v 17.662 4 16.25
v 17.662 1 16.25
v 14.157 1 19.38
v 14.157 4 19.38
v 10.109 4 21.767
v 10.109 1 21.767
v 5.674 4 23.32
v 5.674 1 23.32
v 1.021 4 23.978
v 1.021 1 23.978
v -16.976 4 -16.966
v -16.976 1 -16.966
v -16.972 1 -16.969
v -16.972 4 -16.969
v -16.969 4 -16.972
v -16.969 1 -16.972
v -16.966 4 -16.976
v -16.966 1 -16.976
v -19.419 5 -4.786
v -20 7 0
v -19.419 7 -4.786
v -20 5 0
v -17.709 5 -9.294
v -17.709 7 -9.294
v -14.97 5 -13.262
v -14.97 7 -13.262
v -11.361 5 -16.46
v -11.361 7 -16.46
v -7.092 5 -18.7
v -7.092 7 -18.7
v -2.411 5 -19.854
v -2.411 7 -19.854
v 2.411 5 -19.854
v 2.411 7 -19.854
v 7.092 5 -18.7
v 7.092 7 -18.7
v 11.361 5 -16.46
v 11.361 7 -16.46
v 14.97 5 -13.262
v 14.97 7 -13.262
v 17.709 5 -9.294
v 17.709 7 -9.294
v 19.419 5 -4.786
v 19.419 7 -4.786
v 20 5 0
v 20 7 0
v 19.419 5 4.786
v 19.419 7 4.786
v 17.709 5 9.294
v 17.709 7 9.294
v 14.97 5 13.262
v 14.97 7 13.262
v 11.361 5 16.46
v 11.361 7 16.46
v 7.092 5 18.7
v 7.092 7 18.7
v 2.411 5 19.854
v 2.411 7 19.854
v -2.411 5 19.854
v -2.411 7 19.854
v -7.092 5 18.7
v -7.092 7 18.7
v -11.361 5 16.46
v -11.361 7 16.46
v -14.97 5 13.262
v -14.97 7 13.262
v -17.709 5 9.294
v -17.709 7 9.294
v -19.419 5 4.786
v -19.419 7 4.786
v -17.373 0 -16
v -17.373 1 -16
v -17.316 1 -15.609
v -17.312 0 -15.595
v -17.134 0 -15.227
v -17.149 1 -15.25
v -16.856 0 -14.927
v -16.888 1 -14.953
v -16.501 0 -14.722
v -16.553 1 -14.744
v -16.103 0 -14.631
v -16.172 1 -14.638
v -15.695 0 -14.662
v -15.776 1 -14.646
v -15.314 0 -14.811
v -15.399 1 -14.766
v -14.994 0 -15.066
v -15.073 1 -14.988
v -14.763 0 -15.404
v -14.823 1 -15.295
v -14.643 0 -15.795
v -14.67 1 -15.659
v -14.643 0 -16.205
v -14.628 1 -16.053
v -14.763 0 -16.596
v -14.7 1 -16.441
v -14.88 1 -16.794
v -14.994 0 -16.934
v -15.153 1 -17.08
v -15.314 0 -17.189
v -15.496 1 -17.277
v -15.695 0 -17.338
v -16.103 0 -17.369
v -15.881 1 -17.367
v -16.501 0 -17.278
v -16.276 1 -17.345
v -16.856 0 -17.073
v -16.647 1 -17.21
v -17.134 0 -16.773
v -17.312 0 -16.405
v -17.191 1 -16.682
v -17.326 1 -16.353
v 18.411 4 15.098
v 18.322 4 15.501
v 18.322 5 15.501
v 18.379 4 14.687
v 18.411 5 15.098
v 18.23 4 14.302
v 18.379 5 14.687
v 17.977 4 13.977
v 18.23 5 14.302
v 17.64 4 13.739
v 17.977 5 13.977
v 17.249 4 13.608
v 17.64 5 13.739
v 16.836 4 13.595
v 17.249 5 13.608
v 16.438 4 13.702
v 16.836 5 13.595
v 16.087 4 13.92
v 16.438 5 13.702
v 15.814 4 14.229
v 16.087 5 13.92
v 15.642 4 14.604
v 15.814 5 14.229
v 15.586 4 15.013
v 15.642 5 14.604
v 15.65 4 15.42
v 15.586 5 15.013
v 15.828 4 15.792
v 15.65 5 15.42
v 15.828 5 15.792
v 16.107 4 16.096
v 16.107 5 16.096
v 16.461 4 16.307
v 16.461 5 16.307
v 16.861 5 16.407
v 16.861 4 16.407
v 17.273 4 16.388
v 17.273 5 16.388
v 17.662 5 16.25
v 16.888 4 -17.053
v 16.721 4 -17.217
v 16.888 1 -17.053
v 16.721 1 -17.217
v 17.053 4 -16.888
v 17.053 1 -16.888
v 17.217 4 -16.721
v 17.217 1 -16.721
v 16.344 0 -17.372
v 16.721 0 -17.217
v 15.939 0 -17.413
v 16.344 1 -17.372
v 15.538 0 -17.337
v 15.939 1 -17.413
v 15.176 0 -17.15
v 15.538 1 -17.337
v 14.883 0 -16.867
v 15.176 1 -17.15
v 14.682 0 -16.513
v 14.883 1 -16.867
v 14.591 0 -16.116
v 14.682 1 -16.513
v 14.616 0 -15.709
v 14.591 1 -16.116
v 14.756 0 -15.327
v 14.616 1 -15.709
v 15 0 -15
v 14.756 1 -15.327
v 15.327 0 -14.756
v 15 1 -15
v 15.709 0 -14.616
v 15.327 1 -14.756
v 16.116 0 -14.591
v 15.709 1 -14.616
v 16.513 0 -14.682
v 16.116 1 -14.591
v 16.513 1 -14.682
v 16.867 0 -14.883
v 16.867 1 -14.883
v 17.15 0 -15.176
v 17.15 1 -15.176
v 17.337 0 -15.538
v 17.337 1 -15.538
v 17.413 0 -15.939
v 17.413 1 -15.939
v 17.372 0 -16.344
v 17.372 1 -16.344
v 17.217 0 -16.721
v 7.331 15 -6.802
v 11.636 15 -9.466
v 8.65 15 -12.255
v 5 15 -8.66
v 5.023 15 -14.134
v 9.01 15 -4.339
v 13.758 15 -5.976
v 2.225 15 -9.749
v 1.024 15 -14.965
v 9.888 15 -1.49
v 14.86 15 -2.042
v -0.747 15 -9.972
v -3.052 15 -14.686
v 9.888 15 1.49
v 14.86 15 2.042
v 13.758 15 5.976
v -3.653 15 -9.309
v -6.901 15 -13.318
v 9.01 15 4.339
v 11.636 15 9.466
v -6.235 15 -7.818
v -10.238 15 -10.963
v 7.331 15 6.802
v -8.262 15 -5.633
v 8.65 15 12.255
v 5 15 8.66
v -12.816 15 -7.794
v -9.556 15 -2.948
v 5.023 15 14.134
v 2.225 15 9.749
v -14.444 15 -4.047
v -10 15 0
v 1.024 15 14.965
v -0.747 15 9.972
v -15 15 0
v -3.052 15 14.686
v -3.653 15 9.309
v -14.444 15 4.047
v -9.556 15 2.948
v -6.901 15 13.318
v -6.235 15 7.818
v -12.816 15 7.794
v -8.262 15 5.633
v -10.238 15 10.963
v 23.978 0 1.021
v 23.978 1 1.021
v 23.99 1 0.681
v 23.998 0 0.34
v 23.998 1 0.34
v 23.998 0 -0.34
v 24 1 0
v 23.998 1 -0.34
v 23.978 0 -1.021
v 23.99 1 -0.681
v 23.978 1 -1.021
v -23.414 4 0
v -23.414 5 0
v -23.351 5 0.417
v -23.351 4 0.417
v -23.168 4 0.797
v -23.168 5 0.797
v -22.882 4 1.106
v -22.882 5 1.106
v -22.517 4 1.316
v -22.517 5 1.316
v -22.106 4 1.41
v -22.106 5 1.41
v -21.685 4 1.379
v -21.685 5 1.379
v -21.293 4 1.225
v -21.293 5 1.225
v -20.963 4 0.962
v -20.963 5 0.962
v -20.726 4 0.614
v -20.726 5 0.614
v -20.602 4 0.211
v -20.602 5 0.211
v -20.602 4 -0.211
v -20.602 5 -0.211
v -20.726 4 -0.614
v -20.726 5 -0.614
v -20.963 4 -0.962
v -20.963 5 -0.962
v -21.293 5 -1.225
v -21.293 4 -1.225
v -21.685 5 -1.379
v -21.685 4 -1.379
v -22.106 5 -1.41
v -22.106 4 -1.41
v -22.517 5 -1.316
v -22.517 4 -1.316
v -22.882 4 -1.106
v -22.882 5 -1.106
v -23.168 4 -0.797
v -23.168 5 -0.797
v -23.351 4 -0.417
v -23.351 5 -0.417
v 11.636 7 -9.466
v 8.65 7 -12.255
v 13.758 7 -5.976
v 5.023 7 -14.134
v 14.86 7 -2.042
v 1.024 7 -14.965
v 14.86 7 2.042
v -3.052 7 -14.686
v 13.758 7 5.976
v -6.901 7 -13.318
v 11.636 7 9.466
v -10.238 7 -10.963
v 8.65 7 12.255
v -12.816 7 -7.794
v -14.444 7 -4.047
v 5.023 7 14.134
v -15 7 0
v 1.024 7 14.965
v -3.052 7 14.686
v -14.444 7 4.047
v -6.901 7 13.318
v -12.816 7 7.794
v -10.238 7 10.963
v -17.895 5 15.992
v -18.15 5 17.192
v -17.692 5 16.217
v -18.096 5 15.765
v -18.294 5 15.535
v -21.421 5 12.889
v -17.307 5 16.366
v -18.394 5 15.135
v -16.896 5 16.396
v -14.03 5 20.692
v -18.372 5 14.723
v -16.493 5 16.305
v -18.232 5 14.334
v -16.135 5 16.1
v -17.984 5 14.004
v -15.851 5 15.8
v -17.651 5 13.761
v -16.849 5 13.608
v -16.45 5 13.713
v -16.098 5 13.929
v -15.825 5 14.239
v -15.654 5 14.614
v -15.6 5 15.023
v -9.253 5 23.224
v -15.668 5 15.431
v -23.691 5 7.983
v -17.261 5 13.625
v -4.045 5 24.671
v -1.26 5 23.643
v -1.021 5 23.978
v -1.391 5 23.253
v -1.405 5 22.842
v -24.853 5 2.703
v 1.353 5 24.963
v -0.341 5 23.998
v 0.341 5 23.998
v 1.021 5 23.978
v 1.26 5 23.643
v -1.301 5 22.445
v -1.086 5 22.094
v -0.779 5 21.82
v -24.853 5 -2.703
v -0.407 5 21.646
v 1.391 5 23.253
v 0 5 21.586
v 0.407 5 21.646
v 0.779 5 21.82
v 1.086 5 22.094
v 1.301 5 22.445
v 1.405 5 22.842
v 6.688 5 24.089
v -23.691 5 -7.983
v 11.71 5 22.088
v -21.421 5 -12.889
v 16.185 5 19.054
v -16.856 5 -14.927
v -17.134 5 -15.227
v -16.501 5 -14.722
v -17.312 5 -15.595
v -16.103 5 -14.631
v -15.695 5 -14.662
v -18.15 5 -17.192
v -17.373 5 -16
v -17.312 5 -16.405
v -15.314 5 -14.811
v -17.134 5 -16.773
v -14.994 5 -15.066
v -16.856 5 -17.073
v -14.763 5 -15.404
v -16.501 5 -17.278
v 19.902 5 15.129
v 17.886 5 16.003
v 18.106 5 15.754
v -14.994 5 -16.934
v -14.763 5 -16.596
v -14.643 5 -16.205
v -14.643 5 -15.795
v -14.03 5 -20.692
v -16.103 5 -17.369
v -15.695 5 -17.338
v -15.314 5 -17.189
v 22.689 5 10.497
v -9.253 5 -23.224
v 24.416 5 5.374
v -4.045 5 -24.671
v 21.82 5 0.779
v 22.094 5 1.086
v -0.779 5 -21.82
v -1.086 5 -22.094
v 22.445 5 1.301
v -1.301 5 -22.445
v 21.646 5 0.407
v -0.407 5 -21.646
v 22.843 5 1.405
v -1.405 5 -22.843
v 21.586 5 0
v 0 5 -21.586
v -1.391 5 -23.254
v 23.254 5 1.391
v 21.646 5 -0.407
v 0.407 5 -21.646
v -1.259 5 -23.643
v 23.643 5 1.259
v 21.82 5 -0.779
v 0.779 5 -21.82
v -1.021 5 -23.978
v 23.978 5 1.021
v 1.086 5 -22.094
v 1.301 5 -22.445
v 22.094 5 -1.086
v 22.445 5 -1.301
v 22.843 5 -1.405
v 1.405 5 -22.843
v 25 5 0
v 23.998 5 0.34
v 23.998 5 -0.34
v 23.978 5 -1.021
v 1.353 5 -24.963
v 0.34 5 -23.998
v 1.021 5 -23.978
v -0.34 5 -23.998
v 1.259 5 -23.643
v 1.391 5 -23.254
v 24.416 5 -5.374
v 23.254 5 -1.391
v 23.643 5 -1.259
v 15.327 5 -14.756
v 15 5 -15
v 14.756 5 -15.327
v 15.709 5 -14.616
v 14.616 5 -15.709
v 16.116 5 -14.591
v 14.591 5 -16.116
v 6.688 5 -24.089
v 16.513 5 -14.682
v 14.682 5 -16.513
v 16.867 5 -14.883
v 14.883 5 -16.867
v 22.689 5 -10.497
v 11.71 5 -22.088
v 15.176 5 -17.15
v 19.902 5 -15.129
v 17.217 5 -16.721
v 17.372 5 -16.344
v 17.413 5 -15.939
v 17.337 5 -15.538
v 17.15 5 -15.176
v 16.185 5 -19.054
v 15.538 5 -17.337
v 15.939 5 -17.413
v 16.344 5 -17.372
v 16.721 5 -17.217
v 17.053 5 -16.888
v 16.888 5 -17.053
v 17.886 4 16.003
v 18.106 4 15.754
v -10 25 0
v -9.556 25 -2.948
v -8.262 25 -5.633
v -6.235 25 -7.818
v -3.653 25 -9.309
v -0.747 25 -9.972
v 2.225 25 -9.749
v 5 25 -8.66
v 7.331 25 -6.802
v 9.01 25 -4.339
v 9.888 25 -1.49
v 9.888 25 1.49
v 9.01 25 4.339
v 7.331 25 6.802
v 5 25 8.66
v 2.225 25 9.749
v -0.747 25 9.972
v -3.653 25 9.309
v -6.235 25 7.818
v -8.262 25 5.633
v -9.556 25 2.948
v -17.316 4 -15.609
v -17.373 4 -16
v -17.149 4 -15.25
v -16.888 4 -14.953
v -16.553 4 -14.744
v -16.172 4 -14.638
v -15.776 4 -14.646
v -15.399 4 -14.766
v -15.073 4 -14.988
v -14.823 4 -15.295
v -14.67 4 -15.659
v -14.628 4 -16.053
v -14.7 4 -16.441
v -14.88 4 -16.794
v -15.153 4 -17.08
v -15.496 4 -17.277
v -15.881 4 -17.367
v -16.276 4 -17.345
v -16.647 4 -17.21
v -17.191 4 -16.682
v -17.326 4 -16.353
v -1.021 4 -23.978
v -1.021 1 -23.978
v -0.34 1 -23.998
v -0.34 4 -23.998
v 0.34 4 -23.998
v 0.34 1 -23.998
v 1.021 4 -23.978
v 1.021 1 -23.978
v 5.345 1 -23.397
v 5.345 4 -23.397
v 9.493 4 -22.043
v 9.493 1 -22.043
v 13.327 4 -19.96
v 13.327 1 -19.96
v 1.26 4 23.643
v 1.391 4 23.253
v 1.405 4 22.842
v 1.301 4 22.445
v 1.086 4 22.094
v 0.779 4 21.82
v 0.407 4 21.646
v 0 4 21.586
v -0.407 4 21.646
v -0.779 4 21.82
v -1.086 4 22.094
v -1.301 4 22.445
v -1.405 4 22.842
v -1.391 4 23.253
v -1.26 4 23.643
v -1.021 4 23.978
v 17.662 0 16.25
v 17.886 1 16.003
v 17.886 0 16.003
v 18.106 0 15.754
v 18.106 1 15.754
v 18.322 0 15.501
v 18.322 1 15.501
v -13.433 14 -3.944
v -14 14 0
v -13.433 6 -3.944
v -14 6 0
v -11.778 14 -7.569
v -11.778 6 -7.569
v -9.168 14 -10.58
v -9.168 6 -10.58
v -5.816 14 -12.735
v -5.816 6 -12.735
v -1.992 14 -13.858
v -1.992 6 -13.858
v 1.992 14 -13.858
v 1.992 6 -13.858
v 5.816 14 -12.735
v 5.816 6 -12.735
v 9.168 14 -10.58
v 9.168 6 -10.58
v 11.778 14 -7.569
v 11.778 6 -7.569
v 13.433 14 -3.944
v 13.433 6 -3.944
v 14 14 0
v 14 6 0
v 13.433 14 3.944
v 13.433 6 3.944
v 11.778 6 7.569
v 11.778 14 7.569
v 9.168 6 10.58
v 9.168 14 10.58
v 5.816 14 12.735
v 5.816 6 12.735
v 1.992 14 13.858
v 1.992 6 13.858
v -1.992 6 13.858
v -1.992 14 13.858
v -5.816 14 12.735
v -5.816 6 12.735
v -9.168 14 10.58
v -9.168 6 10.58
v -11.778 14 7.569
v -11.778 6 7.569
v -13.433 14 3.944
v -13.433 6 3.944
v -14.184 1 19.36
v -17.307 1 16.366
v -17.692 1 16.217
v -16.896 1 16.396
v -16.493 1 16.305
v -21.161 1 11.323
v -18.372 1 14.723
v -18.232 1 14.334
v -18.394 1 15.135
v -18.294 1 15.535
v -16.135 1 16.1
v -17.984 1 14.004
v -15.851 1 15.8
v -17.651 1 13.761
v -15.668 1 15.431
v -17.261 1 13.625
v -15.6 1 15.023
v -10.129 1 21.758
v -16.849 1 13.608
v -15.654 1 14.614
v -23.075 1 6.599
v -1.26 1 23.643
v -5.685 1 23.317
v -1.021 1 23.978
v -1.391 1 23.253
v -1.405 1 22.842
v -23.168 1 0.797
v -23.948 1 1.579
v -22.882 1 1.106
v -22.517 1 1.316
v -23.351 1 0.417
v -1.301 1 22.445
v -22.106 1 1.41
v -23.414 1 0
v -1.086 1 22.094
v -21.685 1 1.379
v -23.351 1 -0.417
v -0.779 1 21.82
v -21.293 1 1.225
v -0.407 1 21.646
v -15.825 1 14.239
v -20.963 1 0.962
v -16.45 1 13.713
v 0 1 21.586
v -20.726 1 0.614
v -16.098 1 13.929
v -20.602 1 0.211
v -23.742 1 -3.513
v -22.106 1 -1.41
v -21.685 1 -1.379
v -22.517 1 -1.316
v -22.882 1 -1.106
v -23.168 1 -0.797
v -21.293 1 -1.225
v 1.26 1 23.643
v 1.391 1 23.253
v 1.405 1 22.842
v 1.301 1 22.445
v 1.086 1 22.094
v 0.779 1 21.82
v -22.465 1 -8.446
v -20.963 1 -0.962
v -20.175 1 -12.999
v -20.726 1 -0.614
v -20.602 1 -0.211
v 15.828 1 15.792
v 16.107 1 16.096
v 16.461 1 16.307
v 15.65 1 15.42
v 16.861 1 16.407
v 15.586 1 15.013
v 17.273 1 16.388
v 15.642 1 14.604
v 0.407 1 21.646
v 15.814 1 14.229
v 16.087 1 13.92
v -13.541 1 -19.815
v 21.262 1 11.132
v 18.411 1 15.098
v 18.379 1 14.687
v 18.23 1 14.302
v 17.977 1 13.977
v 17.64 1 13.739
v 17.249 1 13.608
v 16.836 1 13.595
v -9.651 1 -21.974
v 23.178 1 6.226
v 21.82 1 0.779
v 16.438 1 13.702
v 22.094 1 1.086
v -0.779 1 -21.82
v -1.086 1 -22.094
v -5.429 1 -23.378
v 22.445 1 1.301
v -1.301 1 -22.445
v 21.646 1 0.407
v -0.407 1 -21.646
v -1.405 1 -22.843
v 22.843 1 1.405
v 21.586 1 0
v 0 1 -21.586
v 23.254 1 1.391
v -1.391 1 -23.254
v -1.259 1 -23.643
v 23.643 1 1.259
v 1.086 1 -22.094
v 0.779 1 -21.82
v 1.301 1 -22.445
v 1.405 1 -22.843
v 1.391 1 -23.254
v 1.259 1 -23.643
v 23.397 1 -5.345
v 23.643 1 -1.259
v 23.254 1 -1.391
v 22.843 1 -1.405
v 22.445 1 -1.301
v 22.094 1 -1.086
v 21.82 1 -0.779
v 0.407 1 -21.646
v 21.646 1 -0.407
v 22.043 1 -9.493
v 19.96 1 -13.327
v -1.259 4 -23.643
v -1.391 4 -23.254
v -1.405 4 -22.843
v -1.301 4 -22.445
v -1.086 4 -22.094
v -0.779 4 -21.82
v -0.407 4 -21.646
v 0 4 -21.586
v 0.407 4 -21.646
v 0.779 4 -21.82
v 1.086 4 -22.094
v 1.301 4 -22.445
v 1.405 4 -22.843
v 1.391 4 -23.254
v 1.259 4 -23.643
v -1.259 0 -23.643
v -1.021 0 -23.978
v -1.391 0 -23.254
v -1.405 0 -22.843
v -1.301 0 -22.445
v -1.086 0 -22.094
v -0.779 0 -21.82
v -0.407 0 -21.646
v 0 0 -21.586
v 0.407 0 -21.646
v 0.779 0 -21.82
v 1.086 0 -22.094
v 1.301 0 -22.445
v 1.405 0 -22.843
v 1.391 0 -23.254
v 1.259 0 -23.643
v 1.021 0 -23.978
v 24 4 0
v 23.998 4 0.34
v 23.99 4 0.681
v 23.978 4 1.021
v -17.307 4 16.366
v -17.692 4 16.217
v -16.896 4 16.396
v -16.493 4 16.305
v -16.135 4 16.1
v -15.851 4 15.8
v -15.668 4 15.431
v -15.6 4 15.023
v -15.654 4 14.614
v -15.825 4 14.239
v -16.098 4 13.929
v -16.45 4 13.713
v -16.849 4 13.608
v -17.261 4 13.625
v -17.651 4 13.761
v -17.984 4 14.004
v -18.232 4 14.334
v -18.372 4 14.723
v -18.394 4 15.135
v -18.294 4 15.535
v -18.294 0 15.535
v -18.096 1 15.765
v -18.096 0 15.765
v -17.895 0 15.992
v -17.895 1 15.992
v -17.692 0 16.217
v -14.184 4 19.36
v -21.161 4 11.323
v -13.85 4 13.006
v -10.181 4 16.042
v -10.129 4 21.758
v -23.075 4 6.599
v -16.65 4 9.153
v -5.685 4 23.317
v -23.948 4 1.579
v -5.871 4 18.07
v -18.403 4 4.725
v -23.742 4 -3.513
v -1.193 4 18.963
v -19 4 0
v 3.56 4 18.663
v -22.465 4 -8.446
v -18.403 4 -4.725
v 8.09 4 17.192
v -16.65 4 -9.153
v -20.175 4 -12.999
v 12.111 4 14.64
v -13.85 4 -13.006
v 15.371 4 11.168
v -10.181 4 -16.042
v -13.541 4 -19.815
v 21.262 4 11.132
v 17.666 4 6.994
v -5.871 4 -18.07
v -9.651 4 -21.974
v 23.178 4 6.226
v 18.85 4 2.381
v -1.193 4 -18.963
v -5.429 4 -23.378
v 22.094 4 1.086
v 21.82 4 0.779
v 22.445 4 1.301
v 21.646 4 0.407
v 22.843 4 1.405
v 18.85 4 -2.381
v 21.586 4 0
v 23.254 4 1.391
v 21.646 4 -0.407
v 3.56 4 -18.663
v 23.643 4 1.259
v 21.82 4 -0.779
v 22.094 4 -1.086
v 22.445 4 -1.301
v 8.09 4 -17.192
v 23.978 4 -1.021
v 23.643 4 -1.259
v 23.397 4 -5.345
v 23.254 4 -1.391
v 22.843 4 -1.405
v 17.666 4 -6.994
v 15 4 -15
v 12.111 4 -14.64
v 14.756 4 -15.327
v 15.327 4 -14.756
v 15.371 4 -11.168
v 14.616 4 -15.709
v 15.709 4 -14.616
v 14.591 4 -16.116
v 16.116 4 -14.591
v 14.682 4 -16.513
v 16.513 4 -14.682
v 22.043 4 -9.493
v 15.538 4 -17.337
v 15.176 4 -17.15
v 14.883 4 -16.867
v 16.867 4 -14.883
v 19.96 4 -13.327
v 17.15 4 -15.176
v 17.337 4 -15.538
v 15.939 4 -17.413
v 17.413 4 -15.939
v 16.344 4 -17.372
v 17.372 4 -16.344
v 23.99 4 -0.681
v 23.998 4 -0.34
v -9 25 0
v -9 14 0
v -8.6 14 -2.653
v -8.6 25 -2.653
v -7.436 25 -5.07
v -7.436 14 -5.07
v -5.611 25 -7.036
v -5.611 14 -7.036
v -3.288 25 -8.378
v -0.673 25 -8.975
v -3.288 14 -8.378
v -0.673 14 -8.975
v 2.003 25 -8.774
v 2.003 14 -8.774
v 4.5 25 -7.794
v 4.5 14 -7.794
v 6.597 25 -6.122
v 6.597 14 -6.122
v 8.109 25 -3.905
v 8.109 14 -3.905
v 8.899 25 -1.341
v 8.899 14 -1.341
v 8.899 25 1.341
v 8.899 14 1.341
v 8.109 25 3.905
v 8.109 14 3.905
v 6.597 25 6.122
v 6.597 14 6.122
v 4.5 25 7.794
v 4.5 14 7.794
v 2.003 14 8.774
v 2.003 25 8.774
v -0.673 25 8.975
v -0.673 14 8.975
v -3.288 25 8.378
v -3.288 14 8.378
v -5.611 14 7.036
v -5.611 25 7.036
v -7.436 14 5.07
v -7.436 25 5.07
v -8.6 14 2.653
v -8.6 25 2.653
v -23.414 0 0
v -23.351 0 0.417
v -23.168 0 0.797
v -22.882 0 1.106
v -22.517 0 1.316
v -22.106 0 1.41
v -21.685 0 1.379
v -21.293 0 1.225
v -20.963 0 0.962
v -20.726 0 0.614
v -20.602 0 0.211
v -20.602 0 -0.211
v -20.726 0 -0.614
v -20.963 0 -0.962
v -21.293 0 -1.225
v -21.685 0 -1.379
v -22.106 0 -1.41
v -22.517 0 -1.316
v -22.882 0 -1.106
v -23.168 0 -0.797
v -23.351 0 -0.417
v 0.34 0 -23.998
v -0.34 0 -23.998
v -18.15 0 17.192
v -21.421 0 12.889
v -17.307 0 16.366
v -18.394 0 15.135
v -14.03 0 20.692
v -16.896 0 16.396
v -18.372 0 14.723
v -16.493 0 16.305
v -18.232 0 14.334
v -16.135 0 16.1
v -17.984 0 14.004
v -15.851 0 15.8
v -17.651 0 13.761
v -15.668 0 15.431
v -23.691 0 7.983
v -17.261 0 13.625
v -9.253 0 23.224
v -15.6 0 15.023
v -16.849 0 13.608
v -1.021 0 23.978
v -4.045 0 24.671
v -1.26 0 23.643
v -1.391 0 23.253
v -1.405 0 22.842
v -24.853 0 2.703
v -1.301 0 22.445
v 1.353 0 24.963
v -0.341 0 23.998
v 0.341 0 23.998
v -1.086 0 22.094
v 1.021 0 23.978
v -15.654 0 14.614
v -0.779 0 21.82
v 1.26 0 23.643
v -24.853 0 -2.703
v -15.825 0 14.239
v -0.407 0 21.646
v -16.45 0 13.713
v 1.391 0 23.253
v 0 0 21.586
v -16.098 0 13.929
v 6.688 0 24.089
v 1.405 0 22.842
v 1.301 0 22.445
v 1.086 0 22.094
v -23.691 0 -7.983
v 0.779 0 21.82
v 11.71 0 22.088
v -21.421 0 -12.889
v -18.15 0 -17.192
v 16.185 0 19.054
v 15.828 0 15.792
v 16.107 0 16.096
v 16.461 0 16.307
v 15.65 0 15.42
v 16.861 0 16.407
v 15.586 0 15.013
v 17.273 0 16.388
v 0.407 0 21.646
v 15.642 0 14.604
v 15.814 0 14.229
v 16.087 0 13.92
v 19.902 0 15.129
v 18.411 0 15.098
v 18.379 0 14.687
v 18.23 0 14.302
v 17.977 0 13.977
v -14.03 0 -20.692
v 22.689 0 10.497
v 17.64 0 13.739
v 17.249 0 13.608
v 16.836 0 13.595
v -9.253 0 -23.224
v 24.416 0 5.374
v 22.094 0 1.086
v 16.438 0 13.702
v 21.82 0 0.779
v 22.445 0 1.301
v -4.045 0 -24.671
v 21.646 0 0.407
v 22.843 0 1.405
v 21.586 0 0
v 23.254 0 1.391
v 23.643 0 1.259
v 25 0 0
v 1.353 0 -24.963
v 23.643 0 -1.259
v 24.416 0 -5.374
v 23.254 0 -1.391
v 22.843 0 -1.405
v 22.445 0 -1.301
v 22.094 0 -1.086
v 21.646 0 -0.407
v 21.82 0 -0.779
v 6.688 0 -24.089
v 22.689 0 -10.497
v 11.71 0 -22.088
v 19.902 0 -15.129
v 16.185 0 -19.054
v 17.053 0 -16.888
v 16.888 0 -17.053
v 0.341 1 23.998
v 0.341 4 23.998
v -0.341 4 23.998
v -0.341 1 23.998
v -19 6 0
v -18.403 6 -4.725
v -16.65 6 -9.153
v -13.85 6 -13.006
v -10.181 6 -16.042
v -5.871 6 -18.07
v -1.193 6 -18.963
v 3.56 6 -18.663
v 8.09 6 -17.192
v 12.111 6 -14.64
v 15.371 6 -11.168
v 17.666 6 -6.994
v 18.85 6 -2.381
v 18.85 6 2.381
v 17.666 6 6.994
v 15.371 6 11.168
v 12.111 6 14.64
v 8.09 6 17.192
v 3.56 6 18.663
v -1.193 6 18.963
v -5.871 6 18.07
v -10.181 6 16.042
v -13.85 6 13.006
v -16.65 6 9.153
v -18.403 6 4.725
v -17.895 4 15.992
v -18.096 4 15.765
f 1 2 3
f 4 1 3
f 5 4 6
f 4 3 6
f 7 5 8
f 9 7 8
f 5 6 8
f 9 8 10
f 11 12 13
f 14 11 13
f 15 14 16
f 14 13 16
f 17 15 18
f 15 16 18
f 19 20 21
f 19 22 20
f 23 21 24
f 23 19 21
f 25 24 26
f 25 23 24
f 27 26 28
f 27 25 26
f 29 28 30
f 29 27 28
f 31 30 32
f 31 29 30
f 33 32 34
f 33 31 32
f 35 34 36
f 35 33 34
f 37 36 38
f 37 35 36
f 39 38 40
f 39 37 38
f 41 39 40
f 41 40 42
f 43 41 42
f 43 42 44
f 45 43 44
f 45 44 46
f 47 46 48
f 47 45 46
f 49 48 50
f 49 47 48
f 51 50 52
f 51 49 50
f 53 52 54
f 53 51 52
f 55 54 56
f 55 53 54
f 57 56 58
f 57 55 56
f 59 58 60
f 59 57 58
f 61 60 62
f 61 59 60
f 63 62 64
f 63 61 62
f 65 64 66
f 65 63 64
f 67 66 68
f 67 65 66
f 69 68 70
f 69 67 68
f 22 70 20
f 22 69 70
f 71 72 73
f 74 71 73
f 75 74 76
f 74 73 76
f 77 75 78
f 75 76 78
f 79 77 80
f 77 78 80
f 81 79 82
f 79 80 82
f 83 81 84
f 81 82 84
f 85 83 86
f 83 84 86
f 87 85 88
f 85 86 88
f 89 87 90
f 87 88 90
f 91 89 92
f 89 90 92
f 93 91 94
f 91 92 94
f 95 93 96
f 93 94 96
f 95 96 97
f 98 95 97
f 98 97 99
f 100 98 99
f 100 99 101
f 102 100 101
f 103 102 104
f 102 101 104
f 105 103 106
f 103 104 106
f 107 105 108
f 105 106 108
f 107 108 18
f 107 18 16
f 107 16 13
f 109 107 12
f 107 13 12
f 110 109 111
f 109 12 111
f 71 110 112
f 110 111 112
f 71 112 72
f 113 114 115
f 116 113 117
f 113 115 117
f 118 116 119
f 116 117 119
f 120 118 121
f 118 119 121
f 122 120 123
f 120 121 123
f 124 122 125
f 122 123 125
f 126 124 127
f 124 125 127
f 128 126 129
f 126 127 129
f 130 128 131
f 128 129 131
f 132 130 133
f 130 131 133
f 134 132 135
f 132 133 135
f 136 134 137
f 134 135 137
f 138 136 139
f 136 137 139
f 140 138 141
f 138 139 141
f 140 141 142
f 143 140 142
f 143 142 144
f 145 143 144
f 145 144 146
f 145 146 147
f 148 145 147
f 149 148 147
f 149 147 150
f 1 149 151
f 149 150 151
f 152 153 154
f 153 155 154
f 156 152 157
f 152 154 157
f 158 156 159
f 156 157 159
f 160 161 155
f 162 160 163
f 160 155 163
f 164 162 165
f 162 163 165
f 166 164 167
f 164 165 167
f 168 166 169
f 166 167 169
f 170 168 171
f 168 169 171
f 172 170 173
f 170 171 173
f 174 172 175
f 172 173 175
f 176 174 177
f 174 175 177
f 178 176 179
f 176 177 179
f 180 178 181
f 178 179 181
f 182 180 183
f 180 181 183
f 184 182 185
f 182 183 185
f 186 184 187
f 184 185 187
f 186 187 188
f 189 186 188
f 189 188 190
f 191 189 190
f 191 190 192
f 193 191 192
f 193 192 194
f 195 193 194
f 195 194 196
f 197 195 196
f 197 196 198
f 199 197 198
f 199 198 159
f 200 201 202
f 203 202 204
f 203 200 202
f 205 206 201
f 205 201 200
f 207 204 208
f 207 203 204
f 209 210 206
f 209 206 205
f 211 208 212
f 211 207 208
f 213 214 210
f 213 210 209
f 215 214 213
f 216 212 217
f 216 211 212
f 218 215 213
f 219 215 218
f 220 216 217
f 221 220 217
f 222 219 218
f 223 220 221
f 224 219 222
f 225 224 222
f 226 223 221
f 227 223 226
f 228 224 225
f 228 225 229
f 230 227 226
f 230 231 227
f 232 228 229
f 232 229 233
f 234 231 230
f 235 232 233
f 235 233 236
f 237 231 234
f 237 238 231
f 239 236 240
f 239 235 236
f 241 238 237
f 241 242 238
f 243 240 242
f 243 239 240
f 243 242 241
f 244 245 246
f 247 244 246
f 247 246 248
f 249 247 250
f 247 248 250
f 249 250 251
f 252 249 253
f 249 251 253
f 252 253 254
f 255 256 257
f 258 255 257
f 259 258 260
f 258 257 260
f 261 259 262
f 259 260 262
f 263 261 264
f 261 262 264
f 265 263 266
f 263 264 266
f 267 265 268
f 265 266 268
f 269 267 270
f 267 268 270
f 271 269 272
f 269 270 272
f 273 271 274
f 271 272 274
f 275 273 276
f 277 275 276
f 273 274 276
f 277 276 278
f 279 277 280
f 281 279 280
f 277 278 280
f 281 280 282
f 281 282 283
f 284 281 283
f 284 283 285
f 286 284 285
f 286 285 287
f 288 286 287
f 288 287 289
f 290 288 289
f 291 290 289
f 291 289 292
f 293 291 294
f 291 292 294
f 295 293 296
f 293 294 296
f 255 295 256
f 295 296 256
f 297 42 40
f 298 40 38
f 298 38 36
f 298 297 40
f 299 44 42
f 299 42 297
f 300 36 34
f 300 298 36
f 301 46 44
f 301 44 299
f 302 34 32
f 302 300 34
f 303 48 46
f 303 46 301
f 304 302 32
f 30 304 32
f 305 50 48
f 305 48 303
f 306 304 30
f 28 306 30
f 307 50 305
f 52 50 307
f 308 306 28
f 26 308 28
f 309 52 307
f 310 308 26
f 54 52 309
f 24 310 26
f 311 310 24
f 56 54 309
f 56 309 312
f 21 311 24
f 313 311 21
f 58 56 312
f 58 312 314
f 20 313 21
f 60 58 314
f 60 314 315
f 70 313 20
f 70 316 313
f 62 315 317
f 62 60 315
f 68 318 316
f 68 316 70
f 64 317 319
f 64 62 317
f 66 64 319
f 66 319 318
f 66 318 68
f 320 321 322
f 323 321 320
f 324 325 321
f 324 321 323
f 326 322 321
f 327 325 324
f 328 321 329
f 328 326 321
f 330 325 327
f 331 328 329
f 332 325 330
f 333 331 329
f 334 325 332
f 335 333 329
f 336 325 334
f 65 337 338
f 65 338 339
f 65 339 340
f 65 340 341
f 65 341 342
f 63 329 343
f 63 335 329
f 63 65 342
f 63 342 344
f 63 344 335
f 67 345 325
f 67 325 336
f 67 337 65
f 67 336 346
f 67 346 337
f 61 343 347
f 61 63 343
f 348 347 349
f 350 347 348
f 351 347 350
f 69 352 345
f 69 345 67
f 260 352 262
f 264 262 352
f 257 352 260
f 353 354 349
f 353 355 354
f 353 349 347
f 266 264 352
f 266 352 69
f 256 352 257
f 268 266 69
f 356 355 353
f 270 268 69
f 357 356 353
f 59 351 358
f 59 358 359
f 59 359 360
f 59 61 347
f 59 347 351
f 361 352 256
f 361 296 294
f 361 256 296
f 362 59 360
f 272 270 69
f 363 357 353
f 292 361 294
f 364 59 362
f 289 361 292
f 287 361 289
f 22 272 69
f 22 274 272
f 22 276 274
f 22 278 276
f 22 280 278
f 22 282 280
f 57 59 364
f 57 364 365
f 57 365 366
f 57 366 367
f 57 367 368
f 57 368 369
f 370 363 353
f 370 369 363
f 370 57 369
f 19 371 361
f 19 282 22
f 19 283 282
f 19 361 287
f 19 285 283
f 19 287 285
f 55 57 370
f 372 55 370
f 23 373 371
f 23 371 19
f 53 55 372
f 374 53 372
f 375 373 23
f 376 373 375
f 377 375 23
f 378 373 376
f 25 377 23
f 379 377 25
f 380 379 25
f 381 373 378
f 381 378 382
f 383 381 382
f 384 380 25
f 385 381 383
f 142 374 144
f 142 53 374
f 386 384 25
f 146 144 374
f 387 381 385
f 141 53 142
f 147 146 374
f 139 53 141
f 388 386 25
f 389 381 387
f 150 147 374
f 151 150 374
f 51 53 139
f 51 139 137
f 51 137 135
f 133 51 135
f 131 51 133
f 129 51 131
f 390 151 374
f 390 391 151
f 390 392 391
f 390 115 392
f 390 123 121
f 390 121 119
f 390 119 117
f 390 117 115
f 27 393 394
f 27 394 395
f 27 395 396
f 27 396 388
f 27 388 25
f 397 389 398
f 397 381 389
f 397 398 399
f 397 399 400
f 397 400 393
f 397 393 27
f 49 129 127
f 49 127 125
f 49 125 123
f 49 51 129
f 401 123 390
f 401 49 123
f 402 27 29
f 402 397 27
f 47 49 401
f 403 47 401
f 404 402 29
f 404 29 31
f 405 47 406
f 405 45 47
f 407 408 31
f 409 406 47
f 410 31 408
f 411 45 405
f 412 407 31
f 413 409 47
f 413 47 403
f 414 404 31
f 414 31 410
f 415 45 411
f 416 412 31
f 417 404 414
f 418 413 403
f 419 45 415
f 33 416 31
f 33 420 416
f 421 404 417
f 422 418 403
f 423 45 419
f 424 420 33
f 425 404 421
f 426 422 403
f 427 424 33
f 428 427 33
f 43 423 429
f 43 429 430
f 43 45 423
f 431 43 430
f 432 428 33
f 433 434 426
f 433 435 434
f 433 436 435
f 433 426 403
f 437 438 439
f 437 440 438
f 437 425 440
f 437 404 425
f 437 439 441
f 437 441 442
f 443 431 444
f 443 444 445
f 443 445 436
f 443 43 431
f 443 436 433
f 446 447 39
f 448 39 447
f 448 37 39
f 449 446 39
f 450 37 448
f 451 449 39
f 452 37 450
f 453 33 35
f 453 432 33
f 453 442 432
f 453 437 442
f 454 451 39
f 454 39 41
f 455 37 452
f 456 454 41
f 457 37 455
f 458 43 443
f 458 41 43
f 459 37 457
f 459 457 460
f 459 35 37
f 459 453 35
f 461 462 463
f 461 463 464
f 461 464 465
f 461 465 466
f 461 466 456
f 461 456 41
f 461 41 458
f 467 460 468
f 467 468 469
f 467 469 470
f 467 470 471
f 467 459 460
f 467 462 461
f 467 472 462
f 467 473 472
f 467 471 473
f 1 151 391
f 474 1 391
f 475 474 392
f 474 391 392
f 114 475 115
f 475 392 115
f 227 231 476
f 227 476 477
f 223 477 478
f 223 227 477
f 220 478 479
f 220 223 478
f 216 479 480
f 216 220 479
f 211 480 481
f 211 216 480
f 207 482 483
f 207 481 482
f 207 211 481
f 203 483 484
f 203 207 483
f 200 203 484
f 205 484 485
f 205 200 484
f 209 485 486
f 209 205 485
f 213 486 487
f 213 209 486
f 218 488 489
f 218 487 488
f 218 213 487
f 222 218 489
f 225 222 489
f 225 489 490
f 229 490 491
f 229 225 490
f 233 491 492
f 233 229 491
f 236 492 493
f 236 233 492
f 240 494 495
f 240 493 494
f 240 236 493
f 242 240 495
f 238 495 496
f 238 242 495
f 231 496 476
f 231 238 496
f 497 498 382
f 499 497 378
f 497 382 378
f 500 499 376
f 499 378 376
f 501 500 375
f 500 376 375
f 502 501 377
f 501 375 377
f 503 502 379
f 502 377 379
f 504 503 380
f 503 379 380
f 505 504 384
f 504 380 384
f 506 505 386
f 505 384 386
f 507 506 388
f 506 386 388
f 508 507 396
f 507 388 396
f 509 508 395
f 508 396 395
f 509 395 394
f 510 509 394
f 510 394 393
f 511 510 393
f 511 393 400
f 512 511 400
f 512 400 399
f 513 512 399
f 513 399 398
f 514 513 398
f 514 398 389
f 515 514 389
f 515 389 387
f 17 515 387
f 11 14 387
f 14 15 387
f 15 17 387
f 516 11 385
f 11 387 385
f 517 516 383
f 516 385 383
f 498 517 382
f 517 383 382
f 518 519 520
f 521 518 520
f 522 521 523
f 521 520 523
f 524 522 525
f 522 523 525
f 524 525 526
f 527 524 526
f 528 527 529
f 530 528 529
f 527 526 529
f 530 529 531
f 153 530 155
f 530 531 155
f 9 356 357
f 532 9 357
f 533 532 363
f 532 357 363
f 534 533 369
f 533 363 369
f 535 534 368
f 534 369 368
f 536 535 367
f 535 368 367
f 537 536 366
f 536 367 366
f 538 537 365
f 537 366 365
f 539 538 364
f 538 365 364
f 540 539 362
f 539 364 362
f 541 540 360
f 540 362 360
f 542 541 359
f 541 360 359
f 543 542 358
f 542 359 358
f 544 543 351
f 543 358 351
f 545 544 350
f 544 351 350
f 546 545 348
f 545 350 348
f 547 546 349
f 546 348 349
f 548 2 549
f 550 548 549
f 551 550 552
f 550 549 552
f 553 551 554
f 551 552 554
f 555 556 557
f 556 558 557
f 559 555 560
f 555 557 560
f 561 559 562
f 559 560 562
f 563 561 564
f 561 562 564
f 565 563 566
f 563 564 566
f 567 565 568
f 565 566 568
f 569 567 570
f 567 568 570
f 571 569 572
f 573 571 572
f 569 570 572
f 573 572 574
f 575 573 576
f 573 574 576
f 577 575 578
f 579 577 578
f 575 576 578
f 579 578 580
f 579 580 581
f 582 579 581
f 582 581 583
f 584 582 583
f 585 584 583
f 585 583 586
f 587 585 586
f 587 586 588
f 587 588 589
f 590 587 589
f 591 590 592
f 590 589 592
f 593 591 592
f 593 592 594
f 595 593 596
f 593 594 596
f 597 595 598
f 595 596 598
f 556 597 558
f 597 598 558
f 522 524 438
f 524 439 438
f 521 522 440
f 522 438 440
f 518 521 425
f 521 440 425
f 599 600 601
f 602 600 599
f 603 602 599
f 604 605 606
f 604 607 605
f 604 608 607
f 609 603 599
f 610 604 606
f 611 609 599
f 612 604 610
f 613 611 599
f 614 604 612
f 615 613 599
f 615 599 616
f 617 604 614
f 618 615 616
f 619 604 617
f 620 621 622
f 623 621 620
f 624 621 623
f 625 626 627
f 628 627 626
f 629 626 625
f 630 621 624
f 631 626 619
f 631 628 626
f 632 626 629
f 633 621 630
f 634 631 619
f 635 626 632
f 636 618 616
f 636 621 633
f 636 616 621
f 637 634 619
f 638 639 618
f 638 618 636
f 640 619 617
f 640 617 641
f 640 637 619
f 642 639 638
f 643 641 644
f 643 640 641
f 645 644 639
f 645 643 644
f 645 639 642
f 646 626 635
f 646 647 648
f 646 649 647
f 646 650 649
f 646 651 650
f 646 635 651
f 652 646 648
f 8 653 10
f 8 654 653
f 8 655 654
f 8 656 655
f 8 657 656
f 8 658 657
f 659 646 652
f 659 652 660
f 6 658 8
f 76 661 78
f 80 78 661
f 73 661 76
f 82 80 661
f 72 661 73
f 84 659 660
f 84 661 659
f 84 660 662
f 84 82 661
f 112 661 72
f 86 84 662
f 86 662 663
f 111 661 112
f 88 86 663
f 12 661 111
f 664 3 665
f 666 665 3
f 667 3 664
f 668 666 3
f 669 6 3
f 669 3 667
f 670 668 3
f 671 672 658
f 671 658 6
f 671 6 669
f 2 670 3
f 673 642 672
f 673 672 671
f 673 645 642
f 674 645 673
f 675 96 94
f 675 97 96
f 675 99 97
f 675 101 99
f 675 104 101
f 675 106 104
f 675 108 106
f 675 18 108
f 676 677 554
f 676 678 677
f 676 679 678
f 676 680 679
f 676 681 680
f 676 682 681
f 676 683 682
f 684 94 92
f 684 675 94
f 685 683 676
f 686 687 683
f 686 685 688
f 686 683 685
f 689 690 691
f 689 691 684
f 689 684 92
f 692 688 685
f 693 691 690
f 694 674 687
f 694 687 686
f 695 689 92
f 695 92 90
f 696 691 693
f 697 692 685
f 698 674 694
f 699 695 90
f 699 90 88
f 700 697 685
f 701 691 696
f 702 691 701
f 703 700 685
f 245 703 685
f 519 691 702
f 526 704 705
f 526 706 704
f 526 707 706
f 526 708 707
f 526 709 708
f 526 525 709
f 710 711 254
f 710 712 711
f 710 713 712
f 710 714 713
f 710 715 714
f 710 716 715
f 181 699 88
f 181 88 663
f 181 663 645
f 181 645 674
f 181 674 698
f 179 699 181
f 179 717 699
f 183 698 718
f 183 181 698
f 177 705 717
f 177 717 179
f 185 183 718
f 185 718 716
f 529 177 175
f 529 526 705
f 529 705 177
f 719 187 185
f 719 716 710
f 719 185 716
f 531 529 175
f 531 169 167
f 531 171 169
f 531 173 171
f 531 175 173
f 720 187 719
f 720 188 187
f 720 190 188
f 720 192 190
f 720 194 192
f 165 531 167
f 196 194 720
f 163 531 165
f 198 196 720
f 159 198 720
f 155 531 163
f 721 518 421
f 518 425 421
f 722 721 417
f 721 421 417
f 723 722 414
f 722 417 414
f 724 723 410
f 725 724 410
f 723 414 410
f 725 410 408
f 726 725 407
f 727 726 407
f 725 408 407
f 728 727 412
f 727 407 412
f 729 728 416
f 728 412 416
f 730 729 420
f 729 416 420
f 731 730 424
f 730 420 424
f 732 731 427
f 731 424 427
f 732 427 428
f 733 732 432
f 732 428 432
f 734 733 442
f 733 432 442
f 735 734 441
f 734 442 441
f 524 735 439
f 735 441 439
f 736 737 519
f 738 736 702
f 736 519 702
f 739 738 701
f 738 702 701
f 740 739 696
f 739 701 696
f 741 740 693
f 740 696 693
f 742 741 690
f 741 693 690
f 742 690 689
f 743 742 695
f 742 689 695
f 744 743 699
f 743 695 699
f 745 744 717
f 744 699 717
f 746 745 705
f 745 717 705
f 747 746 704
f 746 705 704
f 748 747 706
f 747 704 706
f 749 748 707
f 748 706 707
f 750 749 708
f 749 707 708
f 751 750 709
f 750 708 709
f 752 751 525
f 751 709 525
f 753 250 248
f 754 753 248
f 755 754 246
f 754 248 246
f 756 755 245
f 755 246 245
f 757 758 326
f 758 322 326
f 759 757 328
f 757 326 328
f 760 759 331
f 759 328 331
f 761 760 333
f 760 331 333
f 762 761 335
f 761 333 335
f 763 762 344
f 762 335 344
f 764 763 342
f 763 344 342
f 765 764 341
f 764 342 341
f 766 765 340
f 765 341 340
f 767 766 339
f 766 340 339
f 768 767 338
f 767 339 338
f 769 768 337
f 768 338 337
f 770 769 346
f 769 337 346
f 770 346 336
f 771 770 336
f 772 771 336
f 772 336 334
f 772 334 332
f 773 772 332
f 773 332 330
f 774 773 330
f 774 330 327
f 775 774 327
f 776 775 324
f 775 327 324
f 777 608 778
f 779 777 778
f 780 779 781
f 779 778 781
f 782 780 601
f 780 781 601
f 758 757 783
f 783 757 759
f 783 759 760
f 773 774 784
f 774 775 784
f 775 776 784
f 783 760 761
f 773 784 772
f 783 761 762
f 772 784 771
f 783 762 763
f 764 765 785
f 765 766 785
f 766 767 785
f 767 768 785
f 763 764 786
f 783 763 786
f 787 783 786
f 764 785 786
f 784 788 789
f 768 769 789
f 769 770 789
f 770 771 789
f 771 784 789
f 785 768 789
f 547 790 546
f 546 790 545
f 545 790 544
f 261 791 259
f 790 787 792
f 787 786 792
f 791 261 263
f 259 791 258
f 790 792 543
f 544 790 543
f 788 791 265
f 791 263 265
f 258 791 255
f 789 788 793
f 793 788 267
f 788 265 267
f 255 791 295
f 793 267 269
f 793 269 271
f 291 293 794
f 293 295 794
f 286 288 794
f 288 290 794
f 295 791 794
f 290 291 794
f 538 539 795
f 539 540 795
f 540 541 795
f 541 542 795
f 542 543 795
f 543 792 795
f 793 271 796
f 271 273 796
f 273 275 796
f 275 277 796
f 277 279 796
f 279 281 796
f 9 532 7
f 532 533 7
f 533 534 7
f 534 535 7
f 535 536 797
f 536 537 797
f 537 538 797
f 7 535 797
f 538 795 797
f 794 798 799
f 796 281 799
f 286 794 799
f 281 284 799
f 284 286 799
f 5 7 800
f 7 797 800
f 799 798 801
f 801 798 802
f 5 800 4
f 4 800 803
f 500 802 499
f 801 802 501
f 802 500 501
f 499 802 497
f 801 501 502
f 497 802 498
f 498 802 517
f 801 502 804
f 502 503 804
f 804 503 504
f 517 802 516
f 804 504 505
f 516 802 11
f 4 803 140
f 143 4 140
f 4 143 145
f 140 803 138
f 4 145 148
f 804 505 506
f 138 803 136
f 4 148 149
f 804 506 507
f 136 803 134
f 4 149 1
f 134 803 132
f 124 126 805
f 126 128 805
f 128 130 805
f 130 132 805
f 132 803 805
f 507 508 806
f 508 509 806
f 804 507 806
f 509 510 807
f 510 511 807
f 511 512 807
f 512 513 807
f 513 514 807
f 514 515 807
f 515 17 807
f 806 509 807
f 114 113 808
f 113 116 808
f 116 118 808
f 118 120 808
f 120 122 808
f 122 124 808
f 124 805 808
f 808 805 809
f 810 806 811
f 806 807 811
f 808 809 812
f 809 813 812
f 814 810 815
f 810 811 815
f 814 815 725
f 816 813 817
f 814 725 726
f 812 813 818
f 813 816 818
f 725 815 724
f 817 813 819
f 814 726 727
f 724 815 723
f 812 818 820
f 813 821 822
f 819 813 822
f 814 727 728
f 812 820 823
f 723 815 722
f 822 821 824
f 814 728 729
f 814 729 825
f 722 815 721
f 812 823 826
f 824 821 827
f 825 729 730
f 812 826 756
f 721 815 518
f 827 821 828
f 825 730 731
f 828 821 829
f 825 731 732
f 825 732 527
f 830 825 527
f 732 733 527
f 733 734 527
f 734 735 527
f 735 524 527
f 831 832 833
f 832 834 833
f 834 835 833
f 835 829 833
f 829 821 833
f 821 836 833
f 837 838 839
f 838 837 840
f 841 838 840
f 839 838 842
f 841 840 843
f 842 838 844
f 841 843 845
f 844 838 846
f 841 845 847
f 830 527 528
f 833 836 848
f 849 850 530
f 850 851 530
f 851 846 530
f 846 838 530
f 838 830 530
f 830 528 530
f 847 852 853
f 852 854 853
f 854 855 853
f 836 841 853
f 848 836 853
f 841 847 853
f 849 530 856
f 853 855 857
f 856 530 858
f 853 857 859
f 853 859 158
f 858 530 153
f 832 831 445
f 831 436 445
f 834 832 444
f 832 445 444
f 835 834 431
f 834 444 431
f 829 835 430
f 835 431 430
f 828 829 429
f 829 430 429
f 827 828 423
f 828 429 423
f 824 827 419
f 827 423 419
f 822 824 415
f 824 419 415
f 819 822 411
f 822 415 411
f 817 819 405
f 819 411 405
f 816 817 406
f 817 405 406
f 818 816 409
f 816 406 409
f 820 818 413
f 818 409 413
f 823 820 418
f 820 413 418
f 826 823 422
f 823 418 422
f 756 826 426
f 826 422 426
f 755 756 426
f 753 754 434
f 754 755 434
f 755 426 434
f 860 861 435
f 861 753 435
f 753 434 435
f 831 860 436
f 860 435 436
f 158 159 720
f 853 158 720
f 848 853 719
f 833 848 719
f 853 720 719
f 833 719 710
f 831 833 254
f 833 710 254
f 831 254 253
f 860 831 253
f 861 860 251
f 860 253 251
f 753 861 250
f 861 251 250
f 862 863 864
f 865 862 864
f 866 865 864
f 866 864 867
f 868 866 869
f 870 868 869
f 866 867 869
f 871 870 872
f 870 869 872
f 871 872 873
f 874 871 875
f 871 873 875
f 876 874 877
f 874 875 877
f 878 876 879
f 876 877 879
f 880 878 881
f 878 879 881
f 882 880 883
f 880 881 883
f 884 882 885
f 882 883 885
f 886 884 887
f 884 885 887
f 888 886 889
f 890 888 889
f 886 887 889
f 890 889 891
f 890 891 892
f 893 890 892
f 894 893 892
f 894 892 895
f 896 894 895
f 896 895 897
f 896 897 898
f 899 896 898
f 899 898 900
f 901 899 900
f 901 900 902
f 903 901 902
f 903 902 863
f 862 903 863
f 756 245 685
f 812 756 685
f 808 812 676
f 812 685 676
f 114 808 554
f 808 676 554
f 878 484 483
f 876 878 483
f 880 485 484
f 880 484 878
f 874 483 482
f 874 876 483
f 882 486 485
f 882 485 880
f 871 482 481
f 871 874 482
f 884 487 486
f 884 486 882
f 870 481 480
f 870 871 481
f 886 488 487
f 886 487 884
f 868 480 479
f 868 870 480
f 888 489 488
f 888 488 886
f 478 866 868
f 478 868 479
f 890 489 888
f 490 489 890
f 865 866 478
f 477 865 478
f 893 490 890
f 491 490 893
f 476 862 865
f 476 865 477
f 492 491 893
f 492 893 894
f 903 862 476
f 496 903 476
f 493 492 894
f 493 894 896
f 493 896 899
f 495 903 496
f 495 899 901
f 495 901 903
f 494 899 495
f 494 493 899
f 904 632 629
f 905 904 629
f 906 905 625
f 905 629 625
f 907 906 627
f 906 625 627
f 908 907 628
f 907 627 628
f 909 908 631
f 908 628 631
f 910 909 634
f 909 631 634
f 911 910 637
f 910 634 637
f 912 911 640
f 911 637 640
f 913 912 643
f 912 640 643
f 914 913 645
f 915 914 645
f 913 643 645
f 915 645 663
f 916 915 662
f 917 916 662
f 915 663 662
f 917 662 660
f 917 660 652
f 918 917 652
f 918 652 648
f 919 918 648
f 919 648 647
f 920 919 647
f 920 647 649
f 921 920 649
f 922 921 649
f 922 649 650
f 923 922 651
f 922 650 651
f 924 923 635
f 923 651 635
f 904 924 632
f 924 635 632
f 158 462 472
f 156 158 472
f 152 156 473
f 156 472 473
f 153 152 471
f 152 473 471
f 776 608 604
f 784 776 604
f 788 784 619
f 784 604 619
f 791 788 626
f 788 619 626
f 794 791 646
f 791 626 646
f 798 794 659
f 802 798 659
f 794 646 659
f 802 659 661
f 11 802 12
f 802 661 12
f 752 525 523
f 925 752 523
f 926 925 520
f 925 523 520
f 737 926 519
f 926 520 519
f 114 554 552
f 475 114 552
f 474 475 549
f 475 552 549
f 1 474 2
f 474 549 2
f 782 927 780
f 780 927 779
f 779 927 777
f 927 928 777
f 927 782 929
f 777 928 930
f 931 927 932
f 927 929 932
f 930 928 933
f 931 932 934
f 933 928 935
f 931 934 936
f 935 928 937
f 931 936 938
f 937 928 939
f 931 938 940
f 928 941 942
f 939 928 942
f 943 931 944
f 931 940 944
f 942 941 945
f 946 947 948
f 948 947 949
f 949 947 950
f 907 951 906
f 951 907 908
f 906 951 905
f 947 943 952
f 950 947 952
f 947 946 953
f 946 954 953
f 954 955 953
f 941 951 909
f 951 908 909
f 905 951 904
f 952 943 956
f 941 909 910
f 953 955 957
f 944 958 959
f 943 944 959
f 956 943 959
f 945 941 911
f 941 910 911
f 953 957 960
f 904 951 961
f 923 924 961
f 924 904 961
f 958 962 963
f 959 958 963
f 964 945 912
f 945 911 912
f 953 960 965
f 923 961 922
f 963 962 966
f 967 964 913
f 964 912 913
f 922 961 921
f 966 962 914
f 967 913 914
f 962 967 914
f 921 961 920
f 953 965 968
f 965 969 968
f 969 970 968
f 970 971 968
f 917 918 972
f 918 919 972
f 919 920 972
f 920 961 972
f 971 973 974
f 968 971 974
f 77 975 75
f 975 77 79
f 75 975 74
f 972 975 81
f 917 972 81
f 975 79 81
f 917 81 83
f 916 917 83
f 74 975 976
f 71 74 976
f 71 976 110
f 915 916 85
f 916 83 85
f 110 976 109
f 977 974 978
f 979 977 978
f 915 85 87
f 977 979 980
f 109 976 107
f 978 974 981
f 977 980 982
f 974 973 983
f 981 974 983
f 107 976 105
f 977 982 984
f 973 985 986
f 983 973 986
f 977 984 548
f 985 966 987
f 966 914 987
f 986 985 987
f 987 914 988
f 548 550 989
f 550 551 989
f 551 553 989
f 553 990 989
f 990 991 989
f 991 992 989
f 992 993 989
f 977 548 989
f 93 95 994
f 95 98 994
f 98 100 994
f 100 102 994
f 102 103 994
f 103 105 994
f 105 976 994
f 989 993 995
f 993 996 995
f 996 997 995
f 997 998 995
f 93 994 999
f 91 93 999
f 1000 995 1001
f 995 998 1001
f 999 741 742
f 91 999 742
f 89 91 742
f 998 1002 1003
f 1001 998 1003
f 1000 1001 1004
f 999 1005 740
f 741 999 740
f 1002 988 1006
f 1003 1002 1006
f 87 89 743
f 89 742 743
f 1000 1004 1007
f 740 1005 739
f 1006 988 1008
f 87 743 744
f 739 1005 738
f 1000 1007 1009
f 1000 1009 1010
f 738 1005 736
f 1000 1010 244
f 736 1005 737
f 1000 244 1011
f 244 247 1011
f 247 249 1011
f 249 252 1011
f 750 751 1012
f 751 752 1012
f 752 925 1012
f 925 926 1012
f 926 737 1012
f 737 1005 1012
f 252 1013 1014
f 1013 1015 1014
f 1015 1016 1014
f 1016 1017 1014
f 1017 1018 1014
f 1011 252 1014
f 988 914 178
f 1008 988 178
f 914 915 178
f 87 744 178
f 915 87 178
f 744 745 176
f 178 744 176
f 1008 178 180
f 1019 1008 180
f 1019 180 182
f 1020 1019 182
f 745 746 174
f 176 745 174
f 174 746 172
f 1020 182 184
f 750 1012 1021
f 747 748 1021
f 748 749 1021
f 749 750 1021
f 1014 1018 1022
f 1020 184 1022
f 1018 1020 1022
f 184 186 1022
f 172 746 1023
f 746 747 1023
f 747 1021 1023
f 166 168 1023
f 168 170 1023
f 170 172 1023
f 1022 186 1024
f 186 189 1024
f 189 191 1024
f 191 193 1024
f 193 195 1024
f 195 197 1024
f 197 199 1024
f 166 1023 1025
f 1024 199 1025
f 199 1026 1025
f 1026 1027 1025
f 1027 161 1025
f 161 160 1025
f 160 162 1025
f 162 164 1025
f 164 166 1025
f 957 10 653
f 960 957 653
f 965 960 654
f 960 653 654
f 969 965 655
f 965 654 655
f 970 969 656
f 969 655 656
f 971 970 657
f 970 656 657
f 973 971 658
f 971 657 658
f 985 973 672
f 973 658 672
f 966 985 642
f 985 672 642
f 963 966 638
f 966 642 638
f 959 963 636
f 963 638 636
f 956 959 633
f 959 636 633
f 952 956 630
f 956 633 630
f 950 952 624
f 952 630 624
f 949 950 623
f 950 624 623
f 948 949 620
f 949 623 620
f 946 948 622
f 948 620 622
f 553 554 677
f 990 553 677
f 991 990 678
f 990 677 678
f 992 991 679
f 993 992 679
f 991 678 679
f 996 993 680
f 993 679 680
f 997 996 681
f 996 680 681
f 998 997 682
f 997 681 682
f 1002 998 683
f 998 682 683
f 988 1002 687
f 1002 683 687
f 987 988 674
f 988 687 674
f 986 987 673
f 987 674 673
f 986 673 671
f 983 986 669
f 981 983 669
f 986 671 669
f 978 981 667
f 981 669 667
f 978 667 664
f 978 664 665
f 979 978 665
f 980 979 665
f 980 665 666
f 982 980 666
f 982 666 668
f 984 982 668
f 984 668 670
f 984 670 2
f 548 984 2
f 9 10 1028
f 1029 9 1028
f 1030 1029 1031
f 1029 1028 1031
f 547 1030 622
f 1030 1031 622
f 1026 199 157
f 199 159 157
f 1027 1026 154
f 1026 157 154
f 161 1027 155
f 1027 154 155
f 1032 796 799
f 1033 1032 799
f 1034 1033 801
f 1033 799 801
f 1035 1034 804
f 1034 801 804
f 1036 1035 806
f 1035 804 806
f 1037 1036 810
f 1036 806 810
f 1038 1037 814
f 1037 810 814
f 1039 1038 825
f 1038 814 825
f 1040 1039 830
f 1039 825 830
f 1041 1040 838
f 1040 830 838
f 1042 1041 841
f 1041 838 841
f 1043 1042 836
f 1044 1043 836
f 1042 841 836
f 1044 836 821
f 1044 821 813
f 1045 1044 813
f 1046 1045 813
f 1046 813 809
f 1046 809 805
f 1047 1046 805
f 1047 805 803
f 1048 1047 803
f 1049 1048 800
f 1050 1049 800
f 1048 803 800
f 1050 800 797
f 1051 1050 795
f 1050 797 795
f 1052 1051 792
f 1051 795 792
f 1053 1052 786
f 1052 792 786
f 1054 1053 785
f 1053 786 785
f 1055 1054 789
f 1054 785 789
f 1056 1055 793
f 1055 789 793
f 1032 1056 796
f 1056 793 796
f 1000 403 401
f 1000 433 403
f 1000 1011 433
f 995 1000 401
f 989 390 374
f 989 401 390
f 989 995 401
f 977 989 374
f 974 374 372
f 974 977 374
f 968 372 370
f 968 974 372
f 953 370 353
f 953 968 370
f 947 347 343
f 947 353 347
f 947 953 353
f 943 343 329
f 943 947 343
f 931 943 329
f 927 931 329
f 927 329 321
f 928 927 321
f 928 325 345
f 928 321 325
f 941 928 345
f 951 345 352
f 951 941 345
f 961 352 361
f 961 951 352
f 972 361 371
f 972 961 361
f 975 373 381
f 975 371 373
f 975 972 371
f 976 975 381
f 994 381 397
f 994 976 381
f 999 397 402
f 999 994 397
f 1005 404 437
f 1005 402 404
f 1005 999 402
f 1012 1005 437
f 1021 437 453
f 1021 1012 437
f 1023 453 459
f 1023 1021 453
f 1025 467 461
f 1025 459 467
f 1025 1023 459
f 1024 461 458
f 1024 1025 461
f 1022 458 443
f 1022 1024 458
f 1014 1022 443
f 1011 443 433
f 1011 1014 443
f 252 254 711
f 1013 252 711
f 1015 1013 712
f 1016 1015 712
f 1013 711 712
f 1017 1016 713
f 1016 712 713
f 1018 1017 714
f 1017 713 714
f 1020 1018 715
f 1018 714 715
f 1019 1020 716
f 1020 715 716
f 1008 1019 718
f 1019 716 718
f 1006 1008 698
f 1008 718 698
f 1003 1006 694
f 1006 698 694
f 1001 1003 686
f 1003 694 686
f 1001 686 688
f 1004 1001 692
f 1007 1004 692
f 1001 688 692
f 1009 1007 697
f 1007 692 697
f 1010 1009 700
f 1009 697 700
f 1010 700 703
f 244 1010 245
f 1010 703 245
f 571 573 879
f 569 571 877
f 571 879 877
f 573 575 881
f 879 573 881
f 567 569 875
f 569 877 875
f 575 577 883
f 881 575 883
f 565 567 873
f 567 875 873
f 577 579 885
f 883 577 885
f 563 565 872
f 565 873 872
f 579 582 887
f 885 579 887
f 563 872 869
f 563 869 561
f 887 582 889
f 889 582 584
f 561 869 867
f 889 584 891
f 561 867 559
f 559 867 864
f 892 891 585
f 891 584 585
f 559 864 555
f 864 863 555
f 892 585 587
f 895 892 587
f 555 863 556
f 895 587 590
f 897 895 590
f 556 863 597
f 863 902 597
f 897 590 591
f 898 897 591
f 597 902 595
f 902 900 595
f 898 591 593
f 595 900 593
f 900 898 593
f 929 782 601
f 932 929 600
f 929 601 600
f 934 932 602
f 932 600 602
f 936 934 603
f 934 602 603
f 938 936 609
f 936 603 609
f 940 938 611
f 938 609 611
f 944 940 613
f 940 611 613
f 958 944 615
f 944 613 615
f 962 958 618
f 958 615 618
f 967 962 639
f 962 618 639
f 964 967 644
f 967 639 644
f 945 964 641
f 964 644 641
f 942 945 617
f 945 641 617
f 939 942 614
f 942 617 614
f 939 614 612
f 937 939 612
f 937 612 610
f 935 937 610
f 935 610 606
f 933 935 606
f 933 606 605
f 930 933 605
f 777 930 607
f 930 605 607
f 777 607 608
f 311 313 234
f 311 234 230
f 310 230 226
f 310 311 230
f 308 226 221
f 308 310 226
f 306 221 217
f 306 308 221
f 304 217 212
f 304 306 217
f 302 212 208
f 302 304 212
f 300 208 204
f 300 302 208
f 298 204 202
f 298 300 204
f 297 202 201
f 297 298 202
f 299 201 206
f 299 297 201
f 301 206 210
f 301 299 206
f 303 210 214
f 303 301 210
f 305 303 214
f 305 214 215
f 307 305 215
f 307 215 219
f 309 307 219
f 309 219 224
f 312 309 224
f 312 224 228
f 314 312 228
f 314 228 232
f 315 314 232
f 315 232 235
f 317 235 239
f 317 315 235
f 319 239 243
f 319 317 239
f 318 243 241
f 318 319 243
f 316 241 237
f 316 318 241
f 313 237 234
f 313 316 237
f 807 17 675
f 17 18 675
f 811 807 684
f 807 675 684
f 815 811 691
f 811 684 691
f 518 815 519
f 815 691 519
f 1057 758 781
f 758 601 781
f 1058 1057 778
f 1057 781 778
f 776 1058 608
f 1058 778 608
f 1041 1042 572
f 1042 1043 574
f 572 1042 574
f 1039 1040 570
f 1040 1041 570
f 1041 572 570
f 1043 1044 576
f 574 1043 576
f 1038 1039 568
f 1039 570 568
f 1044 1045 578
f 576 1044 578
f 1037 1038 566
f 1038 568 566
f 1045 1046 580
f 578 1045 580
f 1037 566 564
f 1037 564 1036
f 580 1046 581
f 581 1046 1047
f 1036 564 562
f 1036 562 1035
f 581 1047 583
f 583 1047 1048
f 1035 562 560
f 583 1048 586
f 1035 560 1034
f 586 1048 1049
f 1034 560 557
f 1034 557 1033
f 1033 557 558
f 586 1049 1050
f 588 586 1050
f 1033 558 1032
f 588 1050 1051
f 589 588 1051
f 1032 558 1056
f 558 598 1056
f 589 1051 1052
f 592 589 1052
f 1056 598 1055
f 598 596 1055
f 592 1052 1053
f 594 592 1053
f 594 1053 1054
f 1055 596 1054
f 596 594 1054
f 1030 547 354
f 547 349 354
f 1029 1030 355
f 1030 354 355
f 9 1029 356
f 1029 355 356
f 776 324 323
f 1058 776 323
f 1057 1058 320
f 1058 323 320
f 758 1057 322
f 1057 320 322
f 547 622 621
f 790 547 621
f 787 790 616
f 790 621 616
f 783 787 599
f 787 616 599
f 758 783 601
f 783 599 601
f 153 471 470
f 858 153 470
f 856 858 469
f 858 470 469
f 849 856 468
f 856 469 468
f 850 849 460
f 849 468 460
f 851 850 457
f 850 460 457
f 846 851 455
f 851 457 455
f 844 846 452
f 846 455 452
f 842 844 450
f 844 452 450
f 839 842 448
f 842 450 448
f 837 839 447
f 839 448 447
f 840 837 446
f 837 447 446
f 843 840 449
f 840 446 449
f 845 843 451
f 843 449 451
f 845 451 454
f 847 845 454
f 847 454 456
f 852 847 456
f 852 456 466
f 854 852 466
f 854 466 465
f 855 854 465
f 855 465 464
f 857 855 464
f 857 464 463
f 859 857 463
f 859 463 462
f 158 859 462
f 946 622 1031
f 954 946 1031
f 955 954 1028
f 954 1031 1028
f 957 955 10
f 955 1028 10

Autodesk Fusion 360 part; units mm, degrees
sketch "Sketch1" plane through (0, 0, 0) normal (0, 1, 0) x (1, 0, 0)
  circle A0 centre (0, 0) radius 25
  circle A1 centre (0.1317, -22.5832) radius 1.214
  circle A2 centre (20, 0) radius 1.7262
extrude "Extrude1" add sketch "Sketch1" along normal blind 5 contours A0 | A1 | A2
sketch "Sketch2" plane through (0, 5, 0) normal (0, 1, 0) x (-1, 0, 0)
  circle A0 centre (0, 0) radius 25
  circle A1 centre (0, 0) radius 20
extrude "Extrude2" add sketch "Sketch2" along normal blind 2 contours A1
sketch "Sketch3" plane through (0, 7, 0) normal (0, 1, 0) x (-1, 0, 0)
  circle A0 centre (0, 0) radius 20
  circle A1 centre (0, 0) radius 15
extrude "Extrude3" add sketch "Sketch3" along normal blind 8 contours A1
sketch "Sketch4" plane through (0, 15, 0) normal (0, 1, 0) x (-1, 0, 0)
  circle A0 centre (0, 0) radius 15
  circle A1 centre (0, 0) radius 10
extrude "Extrude4" add sketch "Sketch4" along normal blind 10 contours A1
shell "Shell1" thickness 1 removed faces 1 at (-2.3712, 25, -3.5556)
sketch "Sketch5" plane through (0, 5, 0) normal (0, 1, 0) x (-1, 0, 0)
  circle A0 centre (0, 0) radius 20
  circle A1 centre (0, 0) radius 25
  circle A2 centre (0, 23) radius 1.4142
  circle A3 centre (-23, 0) radius 1.414
  circle A4 centre (0, -23) radius 1.414
  circle A5 centre (22, 0) radius 1.414
  circle A6 centre (-17, 15) radius 1.4142
  circle A7 centre (17, 15) radius 1.4
  circle A8 centre (16, -16) radius 1.3726
  circle A9 centre (0, 0) radius 24
  circle A10 centre (-16, -16) radius 1.4142
  line L0 (75, 30) -> (75, -30)
  line L1 (80, 20) -> (80, 0)
  line L2 (80, 0) -> (105, 0)
  line L3 (105, 0) -> (105, 5)
  line L4 (105, 5) -> (90, 5)
  line L5 (90, 5) -> (90, 7)
  line L6 (85, 7) -> (85, 20)
  line L7 (85, 20) -> (80, 20)
  line L8 (85, 7) -> (90, 7)
  dimension "d10" = 2.828
  dimension "d11" = 2.828
  dimension "d12" = 2.828
  dimension "d13" = 2.8
extrude "Extrude5" cut sketch "Sketch5" against normal blind 5 contours A2 A9 | A8 | A7 A9 | A6 A9 | A3 A9 | A4 A9 | A9 A10 | A5 picked at (-0.0096, 23.1937) picked at (17.3227, 15.2673) picked at (-17.3125, 15.2713) picked at (-23.1937, 0) picked at (-0.0096, -23.1938) picked at (-16.2973, -16.3307)
